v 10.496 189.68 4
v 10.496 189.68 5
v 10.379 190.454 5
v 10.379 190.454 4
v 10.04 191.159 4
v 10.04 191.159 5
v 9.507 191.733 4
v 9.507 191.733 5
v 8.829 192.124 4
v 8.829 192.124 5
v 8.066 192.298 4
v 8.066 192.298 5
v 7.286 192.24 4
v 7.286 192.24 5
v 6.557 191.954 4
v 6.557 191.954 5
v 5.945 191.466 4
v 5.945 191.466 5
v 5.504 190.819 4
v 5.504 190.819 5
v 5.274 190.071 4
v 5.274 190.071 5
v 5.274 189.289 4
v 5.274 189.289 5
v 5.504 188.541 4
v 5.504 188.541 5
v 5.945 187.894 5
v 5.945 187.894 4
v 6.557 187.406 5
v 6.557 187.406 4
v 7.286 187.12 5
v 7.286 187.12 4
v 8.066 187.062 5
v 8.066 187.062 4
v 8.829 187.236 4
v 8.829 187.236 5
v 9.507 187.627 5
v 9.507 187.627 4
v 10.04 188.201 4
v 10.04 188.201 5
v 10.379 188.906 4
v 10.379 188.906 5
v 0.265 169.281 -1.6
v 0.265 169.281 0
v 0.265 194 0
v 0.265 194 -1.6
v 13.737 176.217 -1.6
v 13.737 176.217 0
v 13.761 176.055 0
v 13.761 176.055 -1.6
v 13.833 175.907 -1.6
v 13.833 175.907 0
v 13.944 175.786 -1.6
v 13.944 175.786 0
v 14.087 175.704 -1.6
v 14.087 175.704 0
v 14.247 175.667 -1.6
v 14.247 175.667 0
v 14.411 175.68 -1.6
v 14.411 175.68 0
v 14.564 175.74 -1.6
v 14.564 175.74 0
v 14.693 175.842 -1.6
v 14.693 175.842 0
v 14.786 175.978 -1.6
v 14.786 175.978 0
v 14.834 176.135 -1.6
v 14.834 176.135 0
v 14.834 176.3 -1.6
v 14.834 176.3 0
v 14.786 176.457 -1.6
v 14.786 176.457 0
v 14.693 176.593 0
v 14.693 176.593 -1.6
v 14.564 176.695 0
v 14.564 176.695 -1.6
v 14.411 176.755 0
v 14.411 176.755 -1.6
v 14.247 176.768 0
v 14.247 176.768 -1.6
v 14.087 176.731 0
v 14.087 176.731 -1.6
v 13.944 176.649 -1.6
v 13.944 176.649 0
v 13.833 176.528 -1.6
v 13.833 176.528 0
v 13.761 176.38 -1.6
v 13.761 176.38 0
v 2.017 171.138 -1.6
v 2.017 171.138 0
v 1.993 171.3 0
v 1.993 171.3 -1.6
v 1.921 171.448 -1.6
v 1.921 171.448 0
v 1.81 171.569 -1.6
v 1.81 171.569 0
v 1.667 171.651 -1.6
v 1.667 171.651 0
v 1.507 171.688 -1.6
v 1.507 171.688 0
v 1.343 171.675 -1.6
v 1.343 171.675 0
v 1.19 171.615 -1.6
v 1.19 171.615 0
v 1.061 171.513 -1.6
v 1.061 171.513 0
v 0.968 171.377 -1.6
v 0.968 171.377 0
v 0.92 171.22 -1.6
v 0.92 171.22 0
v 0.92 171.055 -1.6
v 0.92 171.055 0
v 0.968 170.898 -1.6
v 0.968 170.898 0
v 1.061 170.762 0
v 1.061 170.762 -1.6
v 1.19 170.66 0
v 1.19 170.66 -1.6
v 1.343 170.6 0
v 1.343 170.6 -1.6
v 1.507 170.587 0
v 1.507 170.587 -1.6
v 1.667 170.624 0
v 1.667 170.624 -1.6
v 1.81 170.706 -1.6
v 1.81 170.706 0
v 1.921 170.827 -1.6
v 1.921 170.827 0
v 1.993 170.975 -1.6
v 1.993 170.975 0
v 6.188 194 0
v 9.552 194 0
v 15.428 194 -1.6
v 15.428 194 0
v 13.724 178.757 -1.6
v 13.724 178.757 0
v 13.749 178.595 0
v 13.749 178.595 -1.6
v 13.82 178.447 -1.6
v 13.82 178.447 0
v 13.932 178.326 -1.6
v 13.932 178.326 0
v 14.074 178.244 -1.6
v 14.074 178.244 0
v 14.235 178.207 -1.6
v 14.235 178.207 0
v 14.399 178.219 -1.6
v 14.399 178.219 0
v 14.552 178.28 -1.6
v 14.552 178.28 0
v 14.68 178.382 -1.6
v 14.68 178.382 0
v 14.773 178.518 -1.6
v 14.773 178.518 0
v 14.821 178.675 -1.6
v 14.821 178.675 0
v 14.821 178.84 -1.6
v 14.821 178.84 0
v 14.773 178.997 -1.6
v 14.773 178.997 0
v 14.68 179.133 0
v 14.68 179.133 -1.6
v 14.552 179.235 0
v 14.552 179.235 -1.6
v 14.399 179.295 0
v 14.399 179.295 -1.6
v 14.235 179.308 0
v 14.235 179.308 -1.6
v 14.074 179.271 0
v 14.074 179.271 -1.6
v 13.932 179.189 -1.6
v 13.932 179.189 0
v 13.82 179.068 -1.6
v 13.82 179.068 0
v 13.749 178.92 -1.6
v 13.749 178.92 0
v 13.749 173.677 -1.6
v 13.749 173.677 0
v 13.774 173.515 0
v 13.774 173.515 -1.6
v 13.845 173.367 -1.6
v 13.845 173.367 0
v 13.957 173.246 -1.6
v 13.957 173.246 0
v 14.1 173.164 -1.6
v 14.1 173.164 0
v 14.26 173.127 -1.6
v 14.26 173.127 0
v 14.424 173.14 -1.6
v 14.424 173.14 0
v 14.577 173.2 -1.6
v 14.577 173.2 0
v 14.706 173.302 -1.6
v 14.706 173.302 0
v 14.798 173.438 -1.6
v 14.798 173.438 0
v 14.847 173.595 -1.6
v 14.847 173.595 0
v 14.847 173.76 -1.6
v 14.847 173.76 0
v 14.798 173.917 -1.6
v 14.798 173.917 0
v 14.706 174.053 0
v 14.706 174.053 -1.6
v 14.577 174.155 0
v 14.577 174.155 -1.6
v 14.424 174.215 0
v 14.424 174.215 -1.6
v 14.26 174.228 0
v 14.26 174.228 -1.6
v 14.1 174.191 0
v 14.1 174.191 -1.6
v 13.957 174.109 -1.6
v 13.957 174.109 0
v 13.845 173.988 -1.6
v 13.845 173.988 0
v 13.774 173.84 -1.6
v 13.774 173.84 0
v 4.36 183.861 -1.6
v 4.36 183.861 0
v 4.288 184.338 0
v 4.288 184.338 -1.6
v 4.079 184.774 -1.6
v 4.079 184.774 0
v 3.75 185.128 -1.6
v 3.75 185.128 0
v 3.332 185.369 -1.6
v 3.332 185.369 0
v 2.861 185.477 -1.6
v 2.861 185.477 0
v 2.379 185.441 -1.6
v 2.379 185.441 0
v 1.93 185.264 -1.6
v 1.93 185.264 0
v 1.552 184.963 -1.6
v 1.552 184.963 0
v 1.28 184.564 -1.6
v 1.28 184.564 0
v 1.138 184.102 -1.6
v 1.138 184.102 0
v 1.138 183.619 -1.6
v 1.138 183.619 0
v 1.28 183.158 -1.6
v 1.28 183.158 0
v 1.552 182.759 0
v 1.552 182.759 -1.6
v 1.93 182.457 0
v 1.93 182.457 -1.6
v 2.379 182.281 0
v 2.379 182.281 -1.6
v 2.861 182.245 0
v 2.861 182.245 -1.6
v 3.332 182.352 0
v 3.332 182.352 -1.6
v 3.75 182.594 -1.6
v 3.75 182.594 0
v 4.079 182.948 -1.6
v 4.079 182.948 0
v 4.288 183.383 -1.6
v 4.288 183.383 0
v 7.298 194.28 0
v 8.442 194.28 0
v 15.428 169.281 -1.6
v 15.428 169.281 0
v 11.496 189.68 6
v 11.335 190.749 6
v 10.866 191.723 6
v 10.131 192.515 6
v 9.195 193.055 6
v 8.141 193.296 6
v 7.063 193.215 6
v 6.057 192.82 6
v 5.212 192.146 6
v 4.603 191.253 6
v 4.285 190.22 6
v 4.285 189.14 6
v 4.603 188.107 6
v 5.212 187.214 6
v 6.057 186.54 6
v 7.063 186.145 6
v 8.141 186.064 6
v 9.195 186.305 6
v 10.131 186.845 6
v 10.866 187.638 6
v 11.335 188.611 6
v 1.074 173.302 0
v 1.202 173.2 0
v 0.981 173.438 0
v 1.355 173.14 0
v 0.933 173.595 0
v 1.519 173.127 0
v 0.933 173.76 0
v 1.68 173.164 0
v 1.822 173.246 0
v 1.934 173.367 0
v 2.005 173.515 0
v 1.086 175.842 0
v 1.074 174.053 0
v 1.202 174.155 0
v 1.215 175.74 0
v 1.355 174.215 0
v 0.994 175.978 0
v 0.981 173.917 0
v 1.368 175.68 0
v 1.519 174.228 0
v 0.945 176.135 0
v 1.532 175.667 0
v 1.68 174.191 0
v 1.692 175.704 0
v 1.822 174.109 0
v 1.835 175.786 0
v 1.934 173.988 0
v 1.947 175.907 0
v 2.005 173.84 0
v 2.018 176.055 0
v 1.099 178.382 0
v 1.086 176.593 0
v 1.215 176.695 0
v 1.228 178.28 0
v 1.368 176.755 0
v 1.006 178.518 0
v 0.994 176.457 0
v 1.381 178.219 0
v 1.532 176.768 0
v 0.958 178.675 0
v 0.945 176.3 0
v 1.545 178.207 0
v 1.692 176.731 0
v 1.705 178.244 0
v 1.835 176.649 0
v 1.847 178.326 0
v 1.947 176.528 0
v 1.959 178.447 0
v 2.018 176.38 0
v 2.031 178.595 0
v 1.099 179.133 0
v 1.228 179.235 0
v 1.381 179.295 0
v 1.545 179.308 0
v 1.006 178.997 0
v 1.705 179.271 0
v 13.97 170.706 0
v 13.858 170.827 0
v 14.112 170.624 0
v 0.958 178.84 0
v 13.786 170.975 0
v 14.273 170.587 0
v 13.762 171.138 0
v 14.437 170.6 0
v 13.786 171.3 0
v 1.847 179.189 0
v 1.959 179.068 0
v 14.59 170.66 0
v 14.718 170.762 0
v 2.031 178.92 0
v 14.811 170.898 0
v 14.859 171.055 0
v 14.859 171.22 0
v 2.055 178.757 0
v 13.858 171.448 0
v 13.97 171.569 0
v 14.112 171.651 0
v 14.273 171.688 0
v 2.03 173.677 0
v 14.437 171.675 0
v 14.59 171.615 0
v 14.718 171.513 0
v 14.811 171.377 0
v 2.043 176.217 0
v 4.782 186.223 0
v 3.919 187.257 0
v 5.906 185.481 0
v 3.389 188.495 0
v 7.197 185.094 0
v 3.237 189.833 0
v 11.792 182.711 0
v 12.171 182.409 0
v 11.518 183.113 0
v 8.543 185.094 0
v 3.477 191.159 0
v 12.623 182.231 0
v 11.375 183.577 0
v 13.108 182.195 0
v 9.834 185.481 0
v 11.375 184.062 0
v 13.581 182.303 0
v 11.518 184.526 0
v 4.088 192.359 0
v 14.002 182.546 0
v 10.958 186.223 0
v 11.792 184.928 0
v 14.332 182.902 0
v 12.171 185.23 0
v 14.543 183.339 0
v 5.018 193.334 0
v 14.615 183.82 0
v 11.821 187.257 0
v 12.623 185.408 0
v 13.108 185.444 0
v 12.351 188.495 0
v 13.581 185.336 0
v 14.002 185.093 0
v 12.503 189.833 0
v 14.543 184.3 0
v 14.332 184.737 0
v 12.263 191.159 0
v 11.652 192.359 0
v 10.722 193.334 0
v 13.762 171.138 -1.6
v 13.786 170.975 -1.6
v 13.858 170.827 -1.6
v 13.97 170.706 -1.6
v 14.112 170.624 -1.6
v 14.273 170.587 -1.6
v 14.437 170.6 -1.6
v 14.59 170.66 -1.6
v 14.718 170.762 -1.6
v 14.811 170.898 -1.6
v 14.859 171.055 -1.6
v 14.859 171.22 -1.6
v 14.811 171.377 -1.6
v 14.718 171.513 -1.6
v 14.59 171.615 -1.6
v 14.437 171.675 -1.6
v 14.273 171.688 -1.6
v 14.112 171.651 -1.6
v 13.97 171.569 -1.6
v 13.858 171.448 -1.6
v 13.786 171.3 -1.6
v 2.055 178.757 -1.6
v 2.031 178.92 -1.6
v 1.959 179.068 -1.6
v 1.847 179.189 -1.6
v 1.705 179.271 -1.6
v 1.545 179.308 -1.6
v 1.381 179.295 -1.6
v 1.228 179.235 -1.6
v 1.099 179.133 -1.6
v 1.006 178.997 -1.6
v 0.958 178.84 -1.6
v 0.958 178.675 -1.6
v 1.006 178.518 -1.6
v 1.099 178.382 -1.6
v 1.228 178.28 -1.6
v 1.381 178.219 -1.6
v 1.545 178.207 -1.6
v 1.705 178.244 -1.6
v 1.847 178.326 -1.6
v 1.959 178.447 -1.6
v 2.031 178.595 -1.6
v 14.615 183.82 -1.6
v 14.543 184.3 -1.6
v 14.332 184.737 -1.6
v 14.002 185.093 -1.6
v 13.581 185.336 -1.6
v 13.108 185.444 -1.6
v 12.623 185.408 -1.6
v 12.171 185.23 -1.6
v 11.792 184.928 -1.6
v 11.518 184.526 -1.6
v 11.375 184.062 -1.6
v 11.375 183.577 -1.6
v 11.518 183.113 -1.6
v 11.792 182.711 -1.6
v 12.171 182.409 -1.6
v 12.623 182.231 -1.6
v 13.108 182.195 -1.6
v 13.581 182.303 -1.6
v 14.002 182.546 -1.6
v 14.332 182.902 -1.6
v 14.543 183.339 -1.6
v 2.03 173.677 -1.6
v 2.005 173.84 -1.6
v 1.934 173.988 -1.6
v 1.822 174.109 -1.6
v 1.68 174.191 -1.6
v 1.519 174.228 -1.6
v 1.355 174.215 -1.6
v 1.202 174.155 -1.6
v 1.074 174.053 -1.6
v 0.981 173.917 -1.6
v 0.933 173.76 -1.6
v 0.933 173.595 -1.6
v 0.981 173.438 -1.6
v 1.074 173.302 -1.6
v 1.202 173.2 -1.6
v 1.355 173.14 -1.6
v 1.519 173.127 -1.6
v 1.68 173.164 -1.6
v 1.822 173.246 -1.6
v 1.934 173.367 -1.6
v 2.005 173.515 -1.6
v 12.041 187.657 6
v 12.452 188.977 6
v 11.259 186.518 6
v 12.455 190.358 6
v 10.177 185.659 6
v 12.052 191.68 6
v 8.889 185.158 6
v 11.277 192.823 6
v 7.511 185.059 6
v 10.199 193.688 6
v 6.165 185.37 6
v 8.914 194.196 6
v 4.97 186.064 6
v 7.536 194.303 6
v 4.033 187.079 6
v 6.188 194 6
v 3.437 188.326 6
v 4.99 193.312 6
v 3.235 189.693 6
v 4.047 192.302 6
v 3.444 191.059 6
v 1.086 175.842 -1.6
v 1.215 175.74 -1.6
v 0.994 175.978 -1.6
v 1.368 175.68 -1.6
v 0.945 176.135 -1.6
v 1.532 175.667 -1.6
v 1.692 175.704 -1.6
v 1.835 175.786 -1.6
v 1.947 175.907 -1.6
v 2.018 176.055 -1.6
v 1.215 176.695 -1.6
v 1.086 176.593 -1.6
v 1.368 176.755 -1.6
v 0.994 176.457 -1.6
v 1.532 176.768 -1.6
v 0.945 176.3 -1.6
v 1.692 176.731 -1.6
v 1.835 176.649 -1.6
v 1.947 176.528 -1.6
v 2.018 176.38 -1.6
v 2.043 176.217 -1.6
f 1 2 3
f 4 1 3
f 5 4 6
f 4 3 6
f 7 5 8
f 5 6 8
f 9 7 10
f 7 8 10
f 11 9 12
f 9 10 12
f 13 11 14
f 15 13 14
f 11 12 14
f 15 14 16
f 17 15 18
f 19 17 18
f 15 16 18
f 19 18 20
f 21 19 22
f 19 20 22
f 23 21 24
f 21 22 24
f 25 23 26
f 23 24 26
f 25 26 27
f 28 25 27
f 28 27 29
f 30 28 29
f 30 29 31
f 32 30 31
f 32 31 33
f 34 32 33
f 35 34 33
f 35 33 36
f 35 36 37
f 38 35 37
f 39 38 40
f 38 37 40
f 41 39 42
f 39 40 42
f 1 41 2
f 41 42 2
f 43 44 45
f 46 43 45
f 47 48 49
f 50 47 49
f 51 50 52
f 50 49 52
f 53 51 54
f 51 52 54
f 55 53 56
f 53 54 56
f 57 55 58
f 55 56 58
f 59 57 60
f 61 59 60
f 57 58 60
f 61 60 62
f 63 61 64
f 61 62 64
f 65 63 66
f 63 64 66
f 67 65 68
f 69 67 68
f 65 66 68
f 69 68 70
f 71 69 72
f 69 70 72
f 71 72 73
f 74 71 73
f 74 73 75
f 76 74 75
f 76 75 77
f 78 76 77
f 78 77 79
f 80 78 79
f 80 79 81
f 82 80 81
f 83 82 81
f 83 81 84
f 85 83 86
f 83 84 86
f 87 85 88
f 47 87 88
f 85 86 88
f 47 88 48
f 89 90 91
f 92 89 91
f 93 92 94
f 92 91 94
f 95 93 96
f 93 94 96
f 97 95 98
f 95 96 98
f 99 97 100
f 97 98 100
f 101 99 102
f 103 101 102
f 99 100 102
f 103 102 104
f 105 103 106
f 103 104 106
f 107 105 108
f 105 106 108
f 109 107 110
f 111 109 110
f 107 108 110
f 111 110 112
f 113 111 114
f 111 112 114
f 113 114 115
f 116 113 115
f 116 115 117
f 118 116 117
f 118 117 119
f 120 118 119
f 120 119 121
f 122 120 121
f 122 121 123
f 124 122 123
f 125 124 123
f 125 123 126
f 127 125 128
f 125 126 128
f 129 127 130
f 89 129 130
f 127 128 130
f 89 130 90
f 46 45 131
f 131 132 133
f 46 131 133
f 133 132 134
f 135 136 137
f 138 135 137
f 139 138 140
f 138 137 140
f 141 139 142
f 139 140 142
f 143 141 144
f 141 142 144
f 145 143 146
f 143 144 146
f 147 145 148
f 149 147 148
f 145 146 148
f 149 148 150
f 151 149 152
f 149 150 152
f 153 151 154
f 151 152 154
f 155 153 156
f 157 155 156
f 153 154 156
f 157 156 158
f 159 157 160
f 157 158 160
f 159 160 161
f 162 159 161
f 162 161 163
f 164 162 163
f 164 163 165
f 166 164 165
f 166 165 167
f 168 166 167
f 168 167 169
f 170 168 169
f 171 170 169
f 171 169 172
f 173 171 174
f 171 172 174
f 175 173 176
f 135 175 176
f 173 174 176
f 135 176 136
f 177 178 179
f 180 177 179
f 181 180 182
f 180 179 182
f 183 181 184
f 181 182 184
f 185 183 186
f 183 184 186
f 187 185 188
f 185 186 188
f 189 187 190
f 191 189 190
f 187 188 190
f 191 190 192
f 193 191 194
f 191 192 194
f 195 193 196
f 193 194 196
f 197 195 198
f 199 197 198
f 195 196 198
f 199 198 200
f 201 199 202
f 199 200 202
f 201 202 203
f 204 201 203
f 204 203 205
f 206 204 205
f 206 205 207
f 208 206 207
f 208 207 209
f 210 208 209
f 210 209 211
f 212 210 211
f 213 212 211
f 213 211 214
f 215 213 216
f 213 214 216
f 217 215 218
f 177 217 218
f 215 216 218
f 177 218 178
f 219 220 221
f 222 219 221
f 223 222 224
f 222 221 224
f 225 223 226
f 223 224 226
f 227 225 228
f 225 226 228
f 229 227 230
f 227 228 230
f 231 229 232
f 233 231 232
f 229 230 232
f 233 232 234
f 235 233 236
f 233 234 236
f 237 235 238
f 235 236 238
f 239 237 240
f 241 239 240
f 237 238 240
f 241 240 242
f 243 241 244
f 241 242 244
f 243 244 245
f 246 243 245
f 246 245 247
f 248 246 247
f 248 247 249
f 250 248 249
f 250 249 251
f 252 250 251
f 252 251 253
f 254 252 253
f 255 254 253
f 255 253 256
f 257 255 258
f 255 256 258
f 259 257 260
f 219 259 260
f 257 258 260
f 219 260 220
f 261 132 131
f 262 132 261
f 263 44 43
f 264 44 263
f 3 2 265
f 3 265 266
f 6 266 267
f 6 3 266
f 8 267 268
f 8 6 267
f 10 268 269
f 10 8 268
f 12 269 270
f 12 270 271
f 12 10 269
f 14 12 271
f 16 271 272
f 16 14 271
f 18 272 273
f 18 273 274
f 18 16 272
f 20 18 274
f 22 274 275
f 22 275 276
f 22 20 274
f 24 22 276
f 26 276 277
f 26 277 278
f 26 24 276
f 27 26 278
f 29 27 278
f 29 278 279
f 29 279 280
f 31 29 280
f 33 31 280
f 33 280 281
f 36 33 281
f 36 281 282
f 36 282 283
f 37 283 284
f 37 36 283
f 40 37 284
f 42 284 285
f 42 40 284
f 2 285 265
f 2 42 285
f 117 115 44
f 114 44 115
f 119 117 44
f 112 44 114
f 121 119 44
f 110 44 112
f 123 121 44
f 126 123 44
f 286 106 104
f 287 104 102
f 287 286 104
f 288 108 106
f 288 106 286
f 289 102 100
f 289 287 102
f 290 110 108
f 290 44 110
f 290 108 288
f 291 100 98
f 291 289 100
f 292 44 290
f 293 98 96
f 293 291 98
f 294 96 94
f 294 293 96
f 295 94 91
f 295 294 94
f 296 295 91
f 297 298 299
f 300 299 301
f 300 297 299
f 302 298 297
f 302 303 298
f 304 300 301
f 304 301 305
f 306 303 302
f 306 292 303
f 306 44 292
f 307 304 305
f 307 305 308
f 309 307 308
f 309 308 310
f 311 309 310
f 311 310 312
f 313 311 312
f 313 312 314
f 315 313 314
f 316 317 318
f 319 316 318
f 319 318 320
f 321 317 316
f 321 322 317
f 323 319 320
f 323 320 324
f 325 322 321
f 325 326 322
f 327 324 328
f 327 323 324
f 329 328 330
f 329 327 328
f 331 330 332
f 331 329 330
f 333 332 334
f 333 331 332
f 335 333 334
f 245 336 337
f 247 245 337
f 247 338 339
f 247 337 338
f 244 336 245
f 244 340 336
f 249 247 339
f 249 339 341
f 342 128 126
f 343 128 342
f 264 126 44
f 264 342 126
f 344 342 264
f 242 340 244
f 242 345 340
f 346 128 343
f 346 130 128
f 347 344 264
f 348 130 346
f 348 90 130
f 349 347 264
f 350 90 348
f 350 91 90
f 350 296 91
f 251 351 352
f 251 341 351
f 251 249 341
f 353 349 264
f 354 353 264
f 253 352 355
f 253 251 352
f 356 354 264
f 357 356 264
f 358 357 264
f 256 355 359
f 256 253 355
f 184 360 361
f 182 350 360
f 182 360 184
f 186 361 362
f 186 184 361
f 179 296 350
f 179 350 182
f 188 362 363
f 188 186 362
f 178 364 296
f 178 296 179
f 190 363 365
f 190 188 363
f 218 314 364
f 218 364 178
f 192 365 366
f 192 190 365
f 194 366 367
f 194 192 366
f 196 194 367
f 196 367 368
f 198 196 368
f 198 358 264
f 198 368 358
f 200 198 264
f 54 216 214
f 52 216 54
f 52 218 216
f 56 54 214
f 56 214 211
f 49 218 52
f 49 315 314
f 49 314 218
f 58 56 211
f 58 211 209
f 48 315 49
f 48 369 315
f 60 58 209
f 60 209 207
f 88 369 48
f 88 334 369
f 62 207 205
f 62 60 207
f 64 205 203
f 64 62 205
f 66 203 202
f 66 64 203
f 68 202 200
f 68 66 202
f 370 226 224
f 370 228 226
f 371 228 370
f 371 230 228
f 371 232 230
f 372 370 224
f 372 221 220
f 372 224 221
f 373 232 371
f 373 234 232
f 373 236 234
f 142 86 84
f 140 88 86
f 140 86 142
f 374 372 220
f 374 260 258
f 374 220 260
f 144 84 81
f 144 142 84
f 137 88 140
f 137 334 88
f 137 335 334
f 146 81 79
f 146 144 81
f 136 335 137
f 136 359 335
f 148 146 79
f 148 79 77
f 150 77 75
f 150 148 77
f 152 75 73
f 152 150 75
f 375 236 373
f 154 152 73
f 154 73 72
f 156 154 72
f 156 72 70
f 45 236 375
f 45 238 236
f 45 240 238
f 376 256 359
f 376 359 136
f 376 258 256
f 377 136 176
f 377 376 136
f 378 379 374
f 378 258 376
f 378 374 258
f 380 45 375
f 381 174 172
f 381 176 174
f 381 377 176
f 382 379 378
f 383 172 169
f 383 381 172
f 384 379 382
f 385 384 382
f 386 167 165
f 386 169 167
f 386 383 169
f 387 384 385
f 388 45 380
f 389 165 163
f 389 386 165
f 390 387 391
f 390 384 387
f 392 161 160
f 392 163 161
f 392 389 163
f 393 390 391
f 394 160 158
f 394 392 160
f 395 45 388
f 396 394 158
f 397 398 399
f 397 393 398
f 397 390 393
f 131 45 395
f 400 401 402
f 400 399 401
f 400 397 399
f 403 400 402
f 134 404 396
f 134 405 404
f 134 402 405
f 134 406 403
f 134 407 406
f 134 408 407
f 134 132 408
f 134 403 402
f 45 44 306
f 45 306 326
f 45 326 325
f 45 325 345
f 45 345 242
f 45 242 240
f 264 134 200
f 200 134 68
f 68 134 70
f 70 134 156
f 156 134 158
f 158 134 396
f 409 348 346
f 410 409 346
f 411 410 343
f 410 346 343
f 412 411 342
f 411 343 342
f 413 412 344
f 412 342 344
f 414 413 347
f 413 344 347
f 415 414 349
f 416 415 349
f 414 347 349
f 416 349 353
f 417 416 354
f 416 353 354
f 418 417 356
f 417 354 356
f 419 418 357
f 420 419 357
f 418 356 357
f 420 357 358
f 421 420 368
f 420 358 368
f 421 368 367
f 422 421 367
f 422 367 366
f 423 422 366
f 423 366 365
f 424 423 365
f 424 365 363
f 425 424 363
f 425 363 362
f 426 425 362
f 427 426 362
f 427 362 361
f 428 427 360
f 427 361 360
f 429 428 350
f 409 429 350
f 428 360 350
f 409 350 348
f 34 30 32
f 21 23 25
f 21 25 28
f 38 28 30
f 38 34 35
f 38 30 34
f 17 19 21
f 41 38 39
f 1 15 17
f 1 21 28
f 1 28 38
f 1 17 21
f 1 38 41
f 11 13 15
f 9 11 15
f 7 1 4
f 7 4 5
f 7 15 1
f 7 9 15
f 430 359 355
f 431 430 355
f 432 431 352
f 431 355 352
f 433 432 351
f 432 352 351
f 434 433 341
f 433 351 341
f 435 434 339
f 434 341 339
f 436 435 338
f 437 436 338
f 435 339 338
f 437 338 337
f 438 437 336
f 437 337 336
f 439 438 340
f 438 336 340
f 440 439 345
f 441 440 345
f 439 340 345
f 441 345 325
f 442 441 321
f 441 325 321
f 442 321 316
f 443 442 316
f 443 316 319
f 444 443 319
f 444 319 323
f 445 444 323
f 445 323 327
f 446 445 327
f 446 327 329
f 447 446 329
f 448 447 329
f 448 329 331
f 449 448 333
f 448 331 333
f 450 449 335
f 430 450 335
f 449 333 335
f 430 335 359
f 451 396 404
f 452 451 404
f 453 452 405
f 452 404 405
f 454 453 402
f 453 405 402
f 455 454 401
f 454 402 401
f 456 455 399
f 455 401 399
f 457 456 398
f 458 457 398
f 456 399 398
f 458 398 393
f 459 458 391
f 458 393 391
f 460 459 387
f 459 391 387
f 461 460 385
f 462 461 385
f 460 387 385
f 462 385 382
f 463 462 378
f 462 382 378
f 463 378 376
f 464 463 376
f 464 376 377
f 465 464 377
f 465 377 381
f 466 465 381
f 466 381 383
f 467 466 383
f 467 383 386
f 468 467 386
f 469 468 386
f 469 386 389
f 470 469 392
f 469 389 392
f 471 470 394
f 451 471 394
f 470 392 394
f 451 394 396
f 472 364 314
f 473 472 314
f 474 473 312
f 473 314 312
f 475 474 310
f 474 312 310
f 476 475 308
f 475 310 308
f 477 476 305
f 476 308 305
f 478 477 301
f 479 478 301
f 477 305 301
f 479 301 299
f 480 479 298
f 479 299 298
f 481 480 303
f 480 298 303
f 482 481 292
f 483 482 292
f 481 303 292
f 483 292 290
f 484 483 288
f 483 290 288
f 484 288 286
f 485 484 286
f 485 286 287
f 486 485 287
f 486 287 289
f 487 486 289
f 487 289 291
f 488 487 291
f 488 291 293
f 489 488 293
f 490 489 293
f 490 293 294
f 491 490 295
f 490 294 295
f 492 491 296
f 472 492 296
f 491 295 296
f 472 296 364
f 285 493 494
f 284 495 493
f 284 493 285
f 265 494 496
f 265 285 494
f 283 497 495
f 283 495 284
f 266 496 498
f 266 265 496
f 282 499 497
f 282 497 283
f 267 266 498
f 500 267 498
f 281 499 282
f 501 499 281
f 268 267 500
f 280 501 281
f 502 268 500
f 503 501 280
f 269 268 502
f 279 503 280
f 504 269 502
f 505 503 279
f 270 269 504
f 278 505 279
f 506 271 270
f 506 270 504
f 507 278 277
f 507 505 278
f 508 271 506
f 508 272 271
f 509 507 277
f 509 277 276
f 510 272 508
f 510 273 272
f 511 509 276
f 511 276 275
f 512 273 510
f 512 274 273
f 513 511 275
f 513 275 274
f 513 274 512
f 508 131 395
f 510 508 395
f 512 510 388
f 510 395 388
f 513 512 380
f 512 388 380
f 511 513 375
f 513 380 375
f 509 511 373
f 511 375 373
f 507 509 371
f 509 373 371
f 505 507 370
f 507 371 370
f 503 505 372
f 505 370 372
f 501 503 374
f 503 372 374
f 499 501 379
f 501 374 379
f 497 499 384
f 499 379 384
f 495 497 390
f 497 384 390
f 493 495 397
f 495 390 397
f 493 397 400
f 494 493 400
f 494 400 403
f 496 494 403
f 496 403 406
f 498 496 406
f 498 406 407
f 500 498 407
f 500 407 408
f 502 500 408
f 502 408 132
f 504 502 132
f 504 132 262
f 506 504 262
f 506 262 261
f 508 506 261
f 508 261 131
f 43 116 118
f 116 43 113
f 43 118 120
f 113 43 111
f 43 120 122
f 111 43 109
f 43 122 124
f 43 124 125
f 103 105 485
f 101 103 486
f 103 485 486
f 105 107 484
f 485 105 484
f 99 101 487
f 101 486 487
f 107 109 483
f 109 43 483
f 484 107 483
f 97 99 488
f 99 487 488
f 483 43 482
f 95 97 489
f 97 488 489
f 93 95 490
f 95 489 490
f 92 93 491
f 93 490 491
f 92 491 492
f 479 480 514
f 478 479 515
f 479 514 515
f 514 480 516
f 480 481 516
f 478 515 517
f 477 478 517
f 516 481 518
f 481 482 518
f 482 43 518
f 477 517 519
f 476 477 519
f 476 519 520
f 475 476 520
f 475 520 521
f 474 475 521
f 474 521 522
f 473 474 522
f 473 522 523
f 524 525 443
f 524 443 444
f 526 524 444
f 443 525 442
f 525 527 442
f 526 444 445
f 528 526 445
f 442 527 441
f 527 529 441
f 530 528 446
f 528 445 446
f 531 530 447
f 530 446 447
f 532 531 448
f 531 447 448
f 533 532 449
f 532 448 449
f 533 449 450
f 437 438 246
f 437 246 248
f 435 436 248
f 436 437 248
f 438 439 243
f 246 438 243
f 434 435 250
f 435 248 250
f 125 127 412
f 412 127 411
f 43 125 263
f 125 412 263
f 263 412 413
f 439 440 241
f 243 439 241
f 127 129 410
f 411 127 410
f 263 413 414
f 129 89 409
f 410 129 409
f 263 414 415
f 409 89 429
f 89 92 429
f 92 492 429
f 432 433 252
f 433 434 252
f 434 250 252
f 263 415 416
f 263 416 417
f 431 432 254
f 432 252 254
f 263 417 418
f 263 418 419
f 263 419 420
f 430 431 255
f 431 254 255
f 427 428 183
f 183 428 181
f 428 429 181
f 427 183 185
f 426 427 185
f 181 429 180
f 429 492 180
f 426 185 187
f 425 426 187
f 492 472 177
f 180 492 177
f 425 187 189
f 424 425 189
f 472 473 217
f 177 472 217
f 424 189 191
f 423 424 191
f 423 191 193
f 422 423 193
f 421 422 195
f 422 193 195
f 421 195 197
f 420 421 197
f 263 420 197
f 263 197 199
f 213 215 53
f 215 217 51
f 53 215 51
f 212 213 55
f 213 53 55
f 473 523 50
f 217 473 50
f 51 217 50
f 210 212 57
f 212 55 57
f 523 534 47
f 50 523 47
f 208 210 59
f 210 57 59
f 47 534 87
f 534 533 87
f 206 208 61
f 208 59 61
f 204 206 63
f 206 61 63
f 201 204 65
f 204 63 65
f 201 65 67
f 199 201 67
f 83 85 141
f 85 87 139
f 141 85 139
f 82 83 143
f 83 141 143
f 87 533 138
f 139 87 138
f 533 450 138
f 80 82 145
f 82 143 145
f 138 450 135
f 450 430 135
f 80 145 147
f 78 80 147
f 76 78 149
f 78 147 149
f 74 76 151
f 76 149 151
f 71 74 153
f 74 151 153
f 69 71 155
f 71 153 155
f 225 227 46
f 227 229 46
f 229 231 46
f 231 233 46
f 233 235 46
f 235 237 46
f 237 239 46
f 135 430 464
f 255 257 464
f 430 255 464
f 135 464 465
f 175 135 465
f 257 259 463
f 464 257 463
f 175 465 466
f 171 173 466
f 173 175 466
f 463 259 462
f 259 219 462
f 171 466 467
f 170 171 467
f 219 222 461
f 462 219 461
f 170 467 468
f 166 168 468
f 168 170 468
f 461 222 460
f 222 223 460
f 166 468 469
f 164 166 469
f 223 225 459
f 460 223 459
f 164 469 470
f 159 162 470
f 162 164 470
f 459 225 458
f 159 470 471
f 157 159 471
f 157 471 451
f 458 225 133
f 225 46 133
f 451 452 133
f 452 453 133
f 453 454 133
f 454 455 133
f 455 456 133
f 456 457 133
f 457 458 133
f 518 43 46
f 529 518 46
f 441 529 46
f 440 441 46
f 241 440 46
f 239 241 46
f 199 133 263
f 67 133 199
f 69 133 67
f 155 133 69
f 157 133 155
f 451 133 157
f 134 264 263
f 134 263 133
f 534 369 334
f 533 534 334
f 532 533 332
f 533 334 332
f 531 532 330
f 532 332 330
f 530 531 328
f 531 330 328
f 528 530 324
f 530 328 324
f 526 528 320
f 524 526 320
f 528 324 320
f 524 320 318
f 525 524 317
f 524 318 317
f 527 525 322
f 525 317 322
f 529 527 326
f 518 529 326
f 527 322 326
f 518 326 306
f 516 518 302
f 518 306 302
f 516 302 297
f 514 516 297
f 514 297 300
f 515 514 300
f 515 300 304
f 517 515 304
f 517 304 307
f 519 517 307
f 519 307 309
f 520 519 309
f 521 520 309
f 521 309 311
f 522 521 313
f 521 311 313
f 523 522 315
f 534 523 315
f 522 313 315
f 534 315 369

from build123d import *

# Parameters (mm, degrees)
ESQUISSE1_W             = 15.163065961
ESQUISSE1_H             = 24.718099935
ESQUISSE1_R             = 1.620437073
ESQUISSE1_R_2           = 1.629155484
ESQUISSE1_R_3           = 0.551783112
BOSS_EXTRU_1_DEPTH      = 1.6
ESQUISSE2_R             = 4.635270965
BOSS_EXTRU_2_DEPTH      = 6
ESQUISSE3_R             = 2.625763286
ENL_V_MAT_EXTRU_1_DEPTH = 2
CHANFREIN1_SIZE         = 1


with BuildPart() as part:
    # Esquisse1 → Boss.-Extru.1 (new body)
    with BuildSketch(Plane.XY):
        with Locations((7.846483978, 181.640524959)):
            Rectangle(ESQUISSE1_W, ESQUISSE1_H)
        with Locations((2.740050159, 183.860713577)):
            Circle(ESQUISSE1_R, mode=Mode.SUBTRACT)
        with Locations((12.98580948, 183.819598973)):
            Circle(ESQUISSE1_R_2, mode=Mode.SUBTRACT)
        with Locations((1.503458801, 178.757435176)):
            Circle(ESQUISSE1_R_3, mode=Mode.SUBTRACT)
        with Locations((1.490795777, 176.217466742)):
            Circle(ESQUISSE1_R_3, mode=Mode.SUBTRACT)
        with Locations((1.478132752, 173.677498307)):
            Circle(ESQUISSE1_R_3, mode=Mode.SUBTRACT)
        with Locations((1.465469727, 171.137529873)):
            Circle(ESQUISSE1_R_3, mode=Mode.SUBTRACT)
        with Locations(Location((14.313761483, 171.137529873, 0), (0, 0, 180))):
            Circle(ESQUISSE1_R_3, mode=Mode.SUBTRACT)
        with Locations(Location((14.301098459, 173.677498307, 0), (0, 0, 180))):
            Circle(ESQUISSE1_R_3, mode=Mode.SUBTRACT)
        with Locations(Location((14.288435434, 176.217466742, 0), (0, 0, 180))):
            Circle(ESQUISSE1_R_3, mode=Mode.SUBTRACT)
        with Locations(Location((14.275772409, 178.757435176, 0), (0, 0, 180))):
            Circle(ESQUISSE1_R_3, mode=Mode.SUBTRACT)
    extrude(amount=-BOSS_EXTRU_1_DEPTH)

    # Esquisse2 → Boss.-Extru.2 (add)
    with BuildSketch(Plane.XY):
        with Locations(Location((7.870027941, 189.680070203, 0), (0, 0, 111.270599652))):
            Circle(ESQUISSE2_R)
    extrude(amount=BOSS_EXTRU_2_DEPTH)

    # Esquisse3 → Enlèv. mat.-Extru.1 (cut)
    with BuildSketch(Plane.XY.offset(6)):
        with Locations((7.870027941, 189.680070203)):
            Circle(ESQUISSE3_R)
    extrude(amount=-ENL_V_MAT_EXTRU_1_DEPTH, mode=Mode.SUBTRACT)

    # Chanfrein1
    chanfrein1_edges = [part.edges().sort_by_distance(p)[0] for p in [
        (5.244264654, 189.680070203, 6),
    ]]
    chamfer(chanfrein1_edges, length=CHANFREIN1_SIZE)


solid = part.part
